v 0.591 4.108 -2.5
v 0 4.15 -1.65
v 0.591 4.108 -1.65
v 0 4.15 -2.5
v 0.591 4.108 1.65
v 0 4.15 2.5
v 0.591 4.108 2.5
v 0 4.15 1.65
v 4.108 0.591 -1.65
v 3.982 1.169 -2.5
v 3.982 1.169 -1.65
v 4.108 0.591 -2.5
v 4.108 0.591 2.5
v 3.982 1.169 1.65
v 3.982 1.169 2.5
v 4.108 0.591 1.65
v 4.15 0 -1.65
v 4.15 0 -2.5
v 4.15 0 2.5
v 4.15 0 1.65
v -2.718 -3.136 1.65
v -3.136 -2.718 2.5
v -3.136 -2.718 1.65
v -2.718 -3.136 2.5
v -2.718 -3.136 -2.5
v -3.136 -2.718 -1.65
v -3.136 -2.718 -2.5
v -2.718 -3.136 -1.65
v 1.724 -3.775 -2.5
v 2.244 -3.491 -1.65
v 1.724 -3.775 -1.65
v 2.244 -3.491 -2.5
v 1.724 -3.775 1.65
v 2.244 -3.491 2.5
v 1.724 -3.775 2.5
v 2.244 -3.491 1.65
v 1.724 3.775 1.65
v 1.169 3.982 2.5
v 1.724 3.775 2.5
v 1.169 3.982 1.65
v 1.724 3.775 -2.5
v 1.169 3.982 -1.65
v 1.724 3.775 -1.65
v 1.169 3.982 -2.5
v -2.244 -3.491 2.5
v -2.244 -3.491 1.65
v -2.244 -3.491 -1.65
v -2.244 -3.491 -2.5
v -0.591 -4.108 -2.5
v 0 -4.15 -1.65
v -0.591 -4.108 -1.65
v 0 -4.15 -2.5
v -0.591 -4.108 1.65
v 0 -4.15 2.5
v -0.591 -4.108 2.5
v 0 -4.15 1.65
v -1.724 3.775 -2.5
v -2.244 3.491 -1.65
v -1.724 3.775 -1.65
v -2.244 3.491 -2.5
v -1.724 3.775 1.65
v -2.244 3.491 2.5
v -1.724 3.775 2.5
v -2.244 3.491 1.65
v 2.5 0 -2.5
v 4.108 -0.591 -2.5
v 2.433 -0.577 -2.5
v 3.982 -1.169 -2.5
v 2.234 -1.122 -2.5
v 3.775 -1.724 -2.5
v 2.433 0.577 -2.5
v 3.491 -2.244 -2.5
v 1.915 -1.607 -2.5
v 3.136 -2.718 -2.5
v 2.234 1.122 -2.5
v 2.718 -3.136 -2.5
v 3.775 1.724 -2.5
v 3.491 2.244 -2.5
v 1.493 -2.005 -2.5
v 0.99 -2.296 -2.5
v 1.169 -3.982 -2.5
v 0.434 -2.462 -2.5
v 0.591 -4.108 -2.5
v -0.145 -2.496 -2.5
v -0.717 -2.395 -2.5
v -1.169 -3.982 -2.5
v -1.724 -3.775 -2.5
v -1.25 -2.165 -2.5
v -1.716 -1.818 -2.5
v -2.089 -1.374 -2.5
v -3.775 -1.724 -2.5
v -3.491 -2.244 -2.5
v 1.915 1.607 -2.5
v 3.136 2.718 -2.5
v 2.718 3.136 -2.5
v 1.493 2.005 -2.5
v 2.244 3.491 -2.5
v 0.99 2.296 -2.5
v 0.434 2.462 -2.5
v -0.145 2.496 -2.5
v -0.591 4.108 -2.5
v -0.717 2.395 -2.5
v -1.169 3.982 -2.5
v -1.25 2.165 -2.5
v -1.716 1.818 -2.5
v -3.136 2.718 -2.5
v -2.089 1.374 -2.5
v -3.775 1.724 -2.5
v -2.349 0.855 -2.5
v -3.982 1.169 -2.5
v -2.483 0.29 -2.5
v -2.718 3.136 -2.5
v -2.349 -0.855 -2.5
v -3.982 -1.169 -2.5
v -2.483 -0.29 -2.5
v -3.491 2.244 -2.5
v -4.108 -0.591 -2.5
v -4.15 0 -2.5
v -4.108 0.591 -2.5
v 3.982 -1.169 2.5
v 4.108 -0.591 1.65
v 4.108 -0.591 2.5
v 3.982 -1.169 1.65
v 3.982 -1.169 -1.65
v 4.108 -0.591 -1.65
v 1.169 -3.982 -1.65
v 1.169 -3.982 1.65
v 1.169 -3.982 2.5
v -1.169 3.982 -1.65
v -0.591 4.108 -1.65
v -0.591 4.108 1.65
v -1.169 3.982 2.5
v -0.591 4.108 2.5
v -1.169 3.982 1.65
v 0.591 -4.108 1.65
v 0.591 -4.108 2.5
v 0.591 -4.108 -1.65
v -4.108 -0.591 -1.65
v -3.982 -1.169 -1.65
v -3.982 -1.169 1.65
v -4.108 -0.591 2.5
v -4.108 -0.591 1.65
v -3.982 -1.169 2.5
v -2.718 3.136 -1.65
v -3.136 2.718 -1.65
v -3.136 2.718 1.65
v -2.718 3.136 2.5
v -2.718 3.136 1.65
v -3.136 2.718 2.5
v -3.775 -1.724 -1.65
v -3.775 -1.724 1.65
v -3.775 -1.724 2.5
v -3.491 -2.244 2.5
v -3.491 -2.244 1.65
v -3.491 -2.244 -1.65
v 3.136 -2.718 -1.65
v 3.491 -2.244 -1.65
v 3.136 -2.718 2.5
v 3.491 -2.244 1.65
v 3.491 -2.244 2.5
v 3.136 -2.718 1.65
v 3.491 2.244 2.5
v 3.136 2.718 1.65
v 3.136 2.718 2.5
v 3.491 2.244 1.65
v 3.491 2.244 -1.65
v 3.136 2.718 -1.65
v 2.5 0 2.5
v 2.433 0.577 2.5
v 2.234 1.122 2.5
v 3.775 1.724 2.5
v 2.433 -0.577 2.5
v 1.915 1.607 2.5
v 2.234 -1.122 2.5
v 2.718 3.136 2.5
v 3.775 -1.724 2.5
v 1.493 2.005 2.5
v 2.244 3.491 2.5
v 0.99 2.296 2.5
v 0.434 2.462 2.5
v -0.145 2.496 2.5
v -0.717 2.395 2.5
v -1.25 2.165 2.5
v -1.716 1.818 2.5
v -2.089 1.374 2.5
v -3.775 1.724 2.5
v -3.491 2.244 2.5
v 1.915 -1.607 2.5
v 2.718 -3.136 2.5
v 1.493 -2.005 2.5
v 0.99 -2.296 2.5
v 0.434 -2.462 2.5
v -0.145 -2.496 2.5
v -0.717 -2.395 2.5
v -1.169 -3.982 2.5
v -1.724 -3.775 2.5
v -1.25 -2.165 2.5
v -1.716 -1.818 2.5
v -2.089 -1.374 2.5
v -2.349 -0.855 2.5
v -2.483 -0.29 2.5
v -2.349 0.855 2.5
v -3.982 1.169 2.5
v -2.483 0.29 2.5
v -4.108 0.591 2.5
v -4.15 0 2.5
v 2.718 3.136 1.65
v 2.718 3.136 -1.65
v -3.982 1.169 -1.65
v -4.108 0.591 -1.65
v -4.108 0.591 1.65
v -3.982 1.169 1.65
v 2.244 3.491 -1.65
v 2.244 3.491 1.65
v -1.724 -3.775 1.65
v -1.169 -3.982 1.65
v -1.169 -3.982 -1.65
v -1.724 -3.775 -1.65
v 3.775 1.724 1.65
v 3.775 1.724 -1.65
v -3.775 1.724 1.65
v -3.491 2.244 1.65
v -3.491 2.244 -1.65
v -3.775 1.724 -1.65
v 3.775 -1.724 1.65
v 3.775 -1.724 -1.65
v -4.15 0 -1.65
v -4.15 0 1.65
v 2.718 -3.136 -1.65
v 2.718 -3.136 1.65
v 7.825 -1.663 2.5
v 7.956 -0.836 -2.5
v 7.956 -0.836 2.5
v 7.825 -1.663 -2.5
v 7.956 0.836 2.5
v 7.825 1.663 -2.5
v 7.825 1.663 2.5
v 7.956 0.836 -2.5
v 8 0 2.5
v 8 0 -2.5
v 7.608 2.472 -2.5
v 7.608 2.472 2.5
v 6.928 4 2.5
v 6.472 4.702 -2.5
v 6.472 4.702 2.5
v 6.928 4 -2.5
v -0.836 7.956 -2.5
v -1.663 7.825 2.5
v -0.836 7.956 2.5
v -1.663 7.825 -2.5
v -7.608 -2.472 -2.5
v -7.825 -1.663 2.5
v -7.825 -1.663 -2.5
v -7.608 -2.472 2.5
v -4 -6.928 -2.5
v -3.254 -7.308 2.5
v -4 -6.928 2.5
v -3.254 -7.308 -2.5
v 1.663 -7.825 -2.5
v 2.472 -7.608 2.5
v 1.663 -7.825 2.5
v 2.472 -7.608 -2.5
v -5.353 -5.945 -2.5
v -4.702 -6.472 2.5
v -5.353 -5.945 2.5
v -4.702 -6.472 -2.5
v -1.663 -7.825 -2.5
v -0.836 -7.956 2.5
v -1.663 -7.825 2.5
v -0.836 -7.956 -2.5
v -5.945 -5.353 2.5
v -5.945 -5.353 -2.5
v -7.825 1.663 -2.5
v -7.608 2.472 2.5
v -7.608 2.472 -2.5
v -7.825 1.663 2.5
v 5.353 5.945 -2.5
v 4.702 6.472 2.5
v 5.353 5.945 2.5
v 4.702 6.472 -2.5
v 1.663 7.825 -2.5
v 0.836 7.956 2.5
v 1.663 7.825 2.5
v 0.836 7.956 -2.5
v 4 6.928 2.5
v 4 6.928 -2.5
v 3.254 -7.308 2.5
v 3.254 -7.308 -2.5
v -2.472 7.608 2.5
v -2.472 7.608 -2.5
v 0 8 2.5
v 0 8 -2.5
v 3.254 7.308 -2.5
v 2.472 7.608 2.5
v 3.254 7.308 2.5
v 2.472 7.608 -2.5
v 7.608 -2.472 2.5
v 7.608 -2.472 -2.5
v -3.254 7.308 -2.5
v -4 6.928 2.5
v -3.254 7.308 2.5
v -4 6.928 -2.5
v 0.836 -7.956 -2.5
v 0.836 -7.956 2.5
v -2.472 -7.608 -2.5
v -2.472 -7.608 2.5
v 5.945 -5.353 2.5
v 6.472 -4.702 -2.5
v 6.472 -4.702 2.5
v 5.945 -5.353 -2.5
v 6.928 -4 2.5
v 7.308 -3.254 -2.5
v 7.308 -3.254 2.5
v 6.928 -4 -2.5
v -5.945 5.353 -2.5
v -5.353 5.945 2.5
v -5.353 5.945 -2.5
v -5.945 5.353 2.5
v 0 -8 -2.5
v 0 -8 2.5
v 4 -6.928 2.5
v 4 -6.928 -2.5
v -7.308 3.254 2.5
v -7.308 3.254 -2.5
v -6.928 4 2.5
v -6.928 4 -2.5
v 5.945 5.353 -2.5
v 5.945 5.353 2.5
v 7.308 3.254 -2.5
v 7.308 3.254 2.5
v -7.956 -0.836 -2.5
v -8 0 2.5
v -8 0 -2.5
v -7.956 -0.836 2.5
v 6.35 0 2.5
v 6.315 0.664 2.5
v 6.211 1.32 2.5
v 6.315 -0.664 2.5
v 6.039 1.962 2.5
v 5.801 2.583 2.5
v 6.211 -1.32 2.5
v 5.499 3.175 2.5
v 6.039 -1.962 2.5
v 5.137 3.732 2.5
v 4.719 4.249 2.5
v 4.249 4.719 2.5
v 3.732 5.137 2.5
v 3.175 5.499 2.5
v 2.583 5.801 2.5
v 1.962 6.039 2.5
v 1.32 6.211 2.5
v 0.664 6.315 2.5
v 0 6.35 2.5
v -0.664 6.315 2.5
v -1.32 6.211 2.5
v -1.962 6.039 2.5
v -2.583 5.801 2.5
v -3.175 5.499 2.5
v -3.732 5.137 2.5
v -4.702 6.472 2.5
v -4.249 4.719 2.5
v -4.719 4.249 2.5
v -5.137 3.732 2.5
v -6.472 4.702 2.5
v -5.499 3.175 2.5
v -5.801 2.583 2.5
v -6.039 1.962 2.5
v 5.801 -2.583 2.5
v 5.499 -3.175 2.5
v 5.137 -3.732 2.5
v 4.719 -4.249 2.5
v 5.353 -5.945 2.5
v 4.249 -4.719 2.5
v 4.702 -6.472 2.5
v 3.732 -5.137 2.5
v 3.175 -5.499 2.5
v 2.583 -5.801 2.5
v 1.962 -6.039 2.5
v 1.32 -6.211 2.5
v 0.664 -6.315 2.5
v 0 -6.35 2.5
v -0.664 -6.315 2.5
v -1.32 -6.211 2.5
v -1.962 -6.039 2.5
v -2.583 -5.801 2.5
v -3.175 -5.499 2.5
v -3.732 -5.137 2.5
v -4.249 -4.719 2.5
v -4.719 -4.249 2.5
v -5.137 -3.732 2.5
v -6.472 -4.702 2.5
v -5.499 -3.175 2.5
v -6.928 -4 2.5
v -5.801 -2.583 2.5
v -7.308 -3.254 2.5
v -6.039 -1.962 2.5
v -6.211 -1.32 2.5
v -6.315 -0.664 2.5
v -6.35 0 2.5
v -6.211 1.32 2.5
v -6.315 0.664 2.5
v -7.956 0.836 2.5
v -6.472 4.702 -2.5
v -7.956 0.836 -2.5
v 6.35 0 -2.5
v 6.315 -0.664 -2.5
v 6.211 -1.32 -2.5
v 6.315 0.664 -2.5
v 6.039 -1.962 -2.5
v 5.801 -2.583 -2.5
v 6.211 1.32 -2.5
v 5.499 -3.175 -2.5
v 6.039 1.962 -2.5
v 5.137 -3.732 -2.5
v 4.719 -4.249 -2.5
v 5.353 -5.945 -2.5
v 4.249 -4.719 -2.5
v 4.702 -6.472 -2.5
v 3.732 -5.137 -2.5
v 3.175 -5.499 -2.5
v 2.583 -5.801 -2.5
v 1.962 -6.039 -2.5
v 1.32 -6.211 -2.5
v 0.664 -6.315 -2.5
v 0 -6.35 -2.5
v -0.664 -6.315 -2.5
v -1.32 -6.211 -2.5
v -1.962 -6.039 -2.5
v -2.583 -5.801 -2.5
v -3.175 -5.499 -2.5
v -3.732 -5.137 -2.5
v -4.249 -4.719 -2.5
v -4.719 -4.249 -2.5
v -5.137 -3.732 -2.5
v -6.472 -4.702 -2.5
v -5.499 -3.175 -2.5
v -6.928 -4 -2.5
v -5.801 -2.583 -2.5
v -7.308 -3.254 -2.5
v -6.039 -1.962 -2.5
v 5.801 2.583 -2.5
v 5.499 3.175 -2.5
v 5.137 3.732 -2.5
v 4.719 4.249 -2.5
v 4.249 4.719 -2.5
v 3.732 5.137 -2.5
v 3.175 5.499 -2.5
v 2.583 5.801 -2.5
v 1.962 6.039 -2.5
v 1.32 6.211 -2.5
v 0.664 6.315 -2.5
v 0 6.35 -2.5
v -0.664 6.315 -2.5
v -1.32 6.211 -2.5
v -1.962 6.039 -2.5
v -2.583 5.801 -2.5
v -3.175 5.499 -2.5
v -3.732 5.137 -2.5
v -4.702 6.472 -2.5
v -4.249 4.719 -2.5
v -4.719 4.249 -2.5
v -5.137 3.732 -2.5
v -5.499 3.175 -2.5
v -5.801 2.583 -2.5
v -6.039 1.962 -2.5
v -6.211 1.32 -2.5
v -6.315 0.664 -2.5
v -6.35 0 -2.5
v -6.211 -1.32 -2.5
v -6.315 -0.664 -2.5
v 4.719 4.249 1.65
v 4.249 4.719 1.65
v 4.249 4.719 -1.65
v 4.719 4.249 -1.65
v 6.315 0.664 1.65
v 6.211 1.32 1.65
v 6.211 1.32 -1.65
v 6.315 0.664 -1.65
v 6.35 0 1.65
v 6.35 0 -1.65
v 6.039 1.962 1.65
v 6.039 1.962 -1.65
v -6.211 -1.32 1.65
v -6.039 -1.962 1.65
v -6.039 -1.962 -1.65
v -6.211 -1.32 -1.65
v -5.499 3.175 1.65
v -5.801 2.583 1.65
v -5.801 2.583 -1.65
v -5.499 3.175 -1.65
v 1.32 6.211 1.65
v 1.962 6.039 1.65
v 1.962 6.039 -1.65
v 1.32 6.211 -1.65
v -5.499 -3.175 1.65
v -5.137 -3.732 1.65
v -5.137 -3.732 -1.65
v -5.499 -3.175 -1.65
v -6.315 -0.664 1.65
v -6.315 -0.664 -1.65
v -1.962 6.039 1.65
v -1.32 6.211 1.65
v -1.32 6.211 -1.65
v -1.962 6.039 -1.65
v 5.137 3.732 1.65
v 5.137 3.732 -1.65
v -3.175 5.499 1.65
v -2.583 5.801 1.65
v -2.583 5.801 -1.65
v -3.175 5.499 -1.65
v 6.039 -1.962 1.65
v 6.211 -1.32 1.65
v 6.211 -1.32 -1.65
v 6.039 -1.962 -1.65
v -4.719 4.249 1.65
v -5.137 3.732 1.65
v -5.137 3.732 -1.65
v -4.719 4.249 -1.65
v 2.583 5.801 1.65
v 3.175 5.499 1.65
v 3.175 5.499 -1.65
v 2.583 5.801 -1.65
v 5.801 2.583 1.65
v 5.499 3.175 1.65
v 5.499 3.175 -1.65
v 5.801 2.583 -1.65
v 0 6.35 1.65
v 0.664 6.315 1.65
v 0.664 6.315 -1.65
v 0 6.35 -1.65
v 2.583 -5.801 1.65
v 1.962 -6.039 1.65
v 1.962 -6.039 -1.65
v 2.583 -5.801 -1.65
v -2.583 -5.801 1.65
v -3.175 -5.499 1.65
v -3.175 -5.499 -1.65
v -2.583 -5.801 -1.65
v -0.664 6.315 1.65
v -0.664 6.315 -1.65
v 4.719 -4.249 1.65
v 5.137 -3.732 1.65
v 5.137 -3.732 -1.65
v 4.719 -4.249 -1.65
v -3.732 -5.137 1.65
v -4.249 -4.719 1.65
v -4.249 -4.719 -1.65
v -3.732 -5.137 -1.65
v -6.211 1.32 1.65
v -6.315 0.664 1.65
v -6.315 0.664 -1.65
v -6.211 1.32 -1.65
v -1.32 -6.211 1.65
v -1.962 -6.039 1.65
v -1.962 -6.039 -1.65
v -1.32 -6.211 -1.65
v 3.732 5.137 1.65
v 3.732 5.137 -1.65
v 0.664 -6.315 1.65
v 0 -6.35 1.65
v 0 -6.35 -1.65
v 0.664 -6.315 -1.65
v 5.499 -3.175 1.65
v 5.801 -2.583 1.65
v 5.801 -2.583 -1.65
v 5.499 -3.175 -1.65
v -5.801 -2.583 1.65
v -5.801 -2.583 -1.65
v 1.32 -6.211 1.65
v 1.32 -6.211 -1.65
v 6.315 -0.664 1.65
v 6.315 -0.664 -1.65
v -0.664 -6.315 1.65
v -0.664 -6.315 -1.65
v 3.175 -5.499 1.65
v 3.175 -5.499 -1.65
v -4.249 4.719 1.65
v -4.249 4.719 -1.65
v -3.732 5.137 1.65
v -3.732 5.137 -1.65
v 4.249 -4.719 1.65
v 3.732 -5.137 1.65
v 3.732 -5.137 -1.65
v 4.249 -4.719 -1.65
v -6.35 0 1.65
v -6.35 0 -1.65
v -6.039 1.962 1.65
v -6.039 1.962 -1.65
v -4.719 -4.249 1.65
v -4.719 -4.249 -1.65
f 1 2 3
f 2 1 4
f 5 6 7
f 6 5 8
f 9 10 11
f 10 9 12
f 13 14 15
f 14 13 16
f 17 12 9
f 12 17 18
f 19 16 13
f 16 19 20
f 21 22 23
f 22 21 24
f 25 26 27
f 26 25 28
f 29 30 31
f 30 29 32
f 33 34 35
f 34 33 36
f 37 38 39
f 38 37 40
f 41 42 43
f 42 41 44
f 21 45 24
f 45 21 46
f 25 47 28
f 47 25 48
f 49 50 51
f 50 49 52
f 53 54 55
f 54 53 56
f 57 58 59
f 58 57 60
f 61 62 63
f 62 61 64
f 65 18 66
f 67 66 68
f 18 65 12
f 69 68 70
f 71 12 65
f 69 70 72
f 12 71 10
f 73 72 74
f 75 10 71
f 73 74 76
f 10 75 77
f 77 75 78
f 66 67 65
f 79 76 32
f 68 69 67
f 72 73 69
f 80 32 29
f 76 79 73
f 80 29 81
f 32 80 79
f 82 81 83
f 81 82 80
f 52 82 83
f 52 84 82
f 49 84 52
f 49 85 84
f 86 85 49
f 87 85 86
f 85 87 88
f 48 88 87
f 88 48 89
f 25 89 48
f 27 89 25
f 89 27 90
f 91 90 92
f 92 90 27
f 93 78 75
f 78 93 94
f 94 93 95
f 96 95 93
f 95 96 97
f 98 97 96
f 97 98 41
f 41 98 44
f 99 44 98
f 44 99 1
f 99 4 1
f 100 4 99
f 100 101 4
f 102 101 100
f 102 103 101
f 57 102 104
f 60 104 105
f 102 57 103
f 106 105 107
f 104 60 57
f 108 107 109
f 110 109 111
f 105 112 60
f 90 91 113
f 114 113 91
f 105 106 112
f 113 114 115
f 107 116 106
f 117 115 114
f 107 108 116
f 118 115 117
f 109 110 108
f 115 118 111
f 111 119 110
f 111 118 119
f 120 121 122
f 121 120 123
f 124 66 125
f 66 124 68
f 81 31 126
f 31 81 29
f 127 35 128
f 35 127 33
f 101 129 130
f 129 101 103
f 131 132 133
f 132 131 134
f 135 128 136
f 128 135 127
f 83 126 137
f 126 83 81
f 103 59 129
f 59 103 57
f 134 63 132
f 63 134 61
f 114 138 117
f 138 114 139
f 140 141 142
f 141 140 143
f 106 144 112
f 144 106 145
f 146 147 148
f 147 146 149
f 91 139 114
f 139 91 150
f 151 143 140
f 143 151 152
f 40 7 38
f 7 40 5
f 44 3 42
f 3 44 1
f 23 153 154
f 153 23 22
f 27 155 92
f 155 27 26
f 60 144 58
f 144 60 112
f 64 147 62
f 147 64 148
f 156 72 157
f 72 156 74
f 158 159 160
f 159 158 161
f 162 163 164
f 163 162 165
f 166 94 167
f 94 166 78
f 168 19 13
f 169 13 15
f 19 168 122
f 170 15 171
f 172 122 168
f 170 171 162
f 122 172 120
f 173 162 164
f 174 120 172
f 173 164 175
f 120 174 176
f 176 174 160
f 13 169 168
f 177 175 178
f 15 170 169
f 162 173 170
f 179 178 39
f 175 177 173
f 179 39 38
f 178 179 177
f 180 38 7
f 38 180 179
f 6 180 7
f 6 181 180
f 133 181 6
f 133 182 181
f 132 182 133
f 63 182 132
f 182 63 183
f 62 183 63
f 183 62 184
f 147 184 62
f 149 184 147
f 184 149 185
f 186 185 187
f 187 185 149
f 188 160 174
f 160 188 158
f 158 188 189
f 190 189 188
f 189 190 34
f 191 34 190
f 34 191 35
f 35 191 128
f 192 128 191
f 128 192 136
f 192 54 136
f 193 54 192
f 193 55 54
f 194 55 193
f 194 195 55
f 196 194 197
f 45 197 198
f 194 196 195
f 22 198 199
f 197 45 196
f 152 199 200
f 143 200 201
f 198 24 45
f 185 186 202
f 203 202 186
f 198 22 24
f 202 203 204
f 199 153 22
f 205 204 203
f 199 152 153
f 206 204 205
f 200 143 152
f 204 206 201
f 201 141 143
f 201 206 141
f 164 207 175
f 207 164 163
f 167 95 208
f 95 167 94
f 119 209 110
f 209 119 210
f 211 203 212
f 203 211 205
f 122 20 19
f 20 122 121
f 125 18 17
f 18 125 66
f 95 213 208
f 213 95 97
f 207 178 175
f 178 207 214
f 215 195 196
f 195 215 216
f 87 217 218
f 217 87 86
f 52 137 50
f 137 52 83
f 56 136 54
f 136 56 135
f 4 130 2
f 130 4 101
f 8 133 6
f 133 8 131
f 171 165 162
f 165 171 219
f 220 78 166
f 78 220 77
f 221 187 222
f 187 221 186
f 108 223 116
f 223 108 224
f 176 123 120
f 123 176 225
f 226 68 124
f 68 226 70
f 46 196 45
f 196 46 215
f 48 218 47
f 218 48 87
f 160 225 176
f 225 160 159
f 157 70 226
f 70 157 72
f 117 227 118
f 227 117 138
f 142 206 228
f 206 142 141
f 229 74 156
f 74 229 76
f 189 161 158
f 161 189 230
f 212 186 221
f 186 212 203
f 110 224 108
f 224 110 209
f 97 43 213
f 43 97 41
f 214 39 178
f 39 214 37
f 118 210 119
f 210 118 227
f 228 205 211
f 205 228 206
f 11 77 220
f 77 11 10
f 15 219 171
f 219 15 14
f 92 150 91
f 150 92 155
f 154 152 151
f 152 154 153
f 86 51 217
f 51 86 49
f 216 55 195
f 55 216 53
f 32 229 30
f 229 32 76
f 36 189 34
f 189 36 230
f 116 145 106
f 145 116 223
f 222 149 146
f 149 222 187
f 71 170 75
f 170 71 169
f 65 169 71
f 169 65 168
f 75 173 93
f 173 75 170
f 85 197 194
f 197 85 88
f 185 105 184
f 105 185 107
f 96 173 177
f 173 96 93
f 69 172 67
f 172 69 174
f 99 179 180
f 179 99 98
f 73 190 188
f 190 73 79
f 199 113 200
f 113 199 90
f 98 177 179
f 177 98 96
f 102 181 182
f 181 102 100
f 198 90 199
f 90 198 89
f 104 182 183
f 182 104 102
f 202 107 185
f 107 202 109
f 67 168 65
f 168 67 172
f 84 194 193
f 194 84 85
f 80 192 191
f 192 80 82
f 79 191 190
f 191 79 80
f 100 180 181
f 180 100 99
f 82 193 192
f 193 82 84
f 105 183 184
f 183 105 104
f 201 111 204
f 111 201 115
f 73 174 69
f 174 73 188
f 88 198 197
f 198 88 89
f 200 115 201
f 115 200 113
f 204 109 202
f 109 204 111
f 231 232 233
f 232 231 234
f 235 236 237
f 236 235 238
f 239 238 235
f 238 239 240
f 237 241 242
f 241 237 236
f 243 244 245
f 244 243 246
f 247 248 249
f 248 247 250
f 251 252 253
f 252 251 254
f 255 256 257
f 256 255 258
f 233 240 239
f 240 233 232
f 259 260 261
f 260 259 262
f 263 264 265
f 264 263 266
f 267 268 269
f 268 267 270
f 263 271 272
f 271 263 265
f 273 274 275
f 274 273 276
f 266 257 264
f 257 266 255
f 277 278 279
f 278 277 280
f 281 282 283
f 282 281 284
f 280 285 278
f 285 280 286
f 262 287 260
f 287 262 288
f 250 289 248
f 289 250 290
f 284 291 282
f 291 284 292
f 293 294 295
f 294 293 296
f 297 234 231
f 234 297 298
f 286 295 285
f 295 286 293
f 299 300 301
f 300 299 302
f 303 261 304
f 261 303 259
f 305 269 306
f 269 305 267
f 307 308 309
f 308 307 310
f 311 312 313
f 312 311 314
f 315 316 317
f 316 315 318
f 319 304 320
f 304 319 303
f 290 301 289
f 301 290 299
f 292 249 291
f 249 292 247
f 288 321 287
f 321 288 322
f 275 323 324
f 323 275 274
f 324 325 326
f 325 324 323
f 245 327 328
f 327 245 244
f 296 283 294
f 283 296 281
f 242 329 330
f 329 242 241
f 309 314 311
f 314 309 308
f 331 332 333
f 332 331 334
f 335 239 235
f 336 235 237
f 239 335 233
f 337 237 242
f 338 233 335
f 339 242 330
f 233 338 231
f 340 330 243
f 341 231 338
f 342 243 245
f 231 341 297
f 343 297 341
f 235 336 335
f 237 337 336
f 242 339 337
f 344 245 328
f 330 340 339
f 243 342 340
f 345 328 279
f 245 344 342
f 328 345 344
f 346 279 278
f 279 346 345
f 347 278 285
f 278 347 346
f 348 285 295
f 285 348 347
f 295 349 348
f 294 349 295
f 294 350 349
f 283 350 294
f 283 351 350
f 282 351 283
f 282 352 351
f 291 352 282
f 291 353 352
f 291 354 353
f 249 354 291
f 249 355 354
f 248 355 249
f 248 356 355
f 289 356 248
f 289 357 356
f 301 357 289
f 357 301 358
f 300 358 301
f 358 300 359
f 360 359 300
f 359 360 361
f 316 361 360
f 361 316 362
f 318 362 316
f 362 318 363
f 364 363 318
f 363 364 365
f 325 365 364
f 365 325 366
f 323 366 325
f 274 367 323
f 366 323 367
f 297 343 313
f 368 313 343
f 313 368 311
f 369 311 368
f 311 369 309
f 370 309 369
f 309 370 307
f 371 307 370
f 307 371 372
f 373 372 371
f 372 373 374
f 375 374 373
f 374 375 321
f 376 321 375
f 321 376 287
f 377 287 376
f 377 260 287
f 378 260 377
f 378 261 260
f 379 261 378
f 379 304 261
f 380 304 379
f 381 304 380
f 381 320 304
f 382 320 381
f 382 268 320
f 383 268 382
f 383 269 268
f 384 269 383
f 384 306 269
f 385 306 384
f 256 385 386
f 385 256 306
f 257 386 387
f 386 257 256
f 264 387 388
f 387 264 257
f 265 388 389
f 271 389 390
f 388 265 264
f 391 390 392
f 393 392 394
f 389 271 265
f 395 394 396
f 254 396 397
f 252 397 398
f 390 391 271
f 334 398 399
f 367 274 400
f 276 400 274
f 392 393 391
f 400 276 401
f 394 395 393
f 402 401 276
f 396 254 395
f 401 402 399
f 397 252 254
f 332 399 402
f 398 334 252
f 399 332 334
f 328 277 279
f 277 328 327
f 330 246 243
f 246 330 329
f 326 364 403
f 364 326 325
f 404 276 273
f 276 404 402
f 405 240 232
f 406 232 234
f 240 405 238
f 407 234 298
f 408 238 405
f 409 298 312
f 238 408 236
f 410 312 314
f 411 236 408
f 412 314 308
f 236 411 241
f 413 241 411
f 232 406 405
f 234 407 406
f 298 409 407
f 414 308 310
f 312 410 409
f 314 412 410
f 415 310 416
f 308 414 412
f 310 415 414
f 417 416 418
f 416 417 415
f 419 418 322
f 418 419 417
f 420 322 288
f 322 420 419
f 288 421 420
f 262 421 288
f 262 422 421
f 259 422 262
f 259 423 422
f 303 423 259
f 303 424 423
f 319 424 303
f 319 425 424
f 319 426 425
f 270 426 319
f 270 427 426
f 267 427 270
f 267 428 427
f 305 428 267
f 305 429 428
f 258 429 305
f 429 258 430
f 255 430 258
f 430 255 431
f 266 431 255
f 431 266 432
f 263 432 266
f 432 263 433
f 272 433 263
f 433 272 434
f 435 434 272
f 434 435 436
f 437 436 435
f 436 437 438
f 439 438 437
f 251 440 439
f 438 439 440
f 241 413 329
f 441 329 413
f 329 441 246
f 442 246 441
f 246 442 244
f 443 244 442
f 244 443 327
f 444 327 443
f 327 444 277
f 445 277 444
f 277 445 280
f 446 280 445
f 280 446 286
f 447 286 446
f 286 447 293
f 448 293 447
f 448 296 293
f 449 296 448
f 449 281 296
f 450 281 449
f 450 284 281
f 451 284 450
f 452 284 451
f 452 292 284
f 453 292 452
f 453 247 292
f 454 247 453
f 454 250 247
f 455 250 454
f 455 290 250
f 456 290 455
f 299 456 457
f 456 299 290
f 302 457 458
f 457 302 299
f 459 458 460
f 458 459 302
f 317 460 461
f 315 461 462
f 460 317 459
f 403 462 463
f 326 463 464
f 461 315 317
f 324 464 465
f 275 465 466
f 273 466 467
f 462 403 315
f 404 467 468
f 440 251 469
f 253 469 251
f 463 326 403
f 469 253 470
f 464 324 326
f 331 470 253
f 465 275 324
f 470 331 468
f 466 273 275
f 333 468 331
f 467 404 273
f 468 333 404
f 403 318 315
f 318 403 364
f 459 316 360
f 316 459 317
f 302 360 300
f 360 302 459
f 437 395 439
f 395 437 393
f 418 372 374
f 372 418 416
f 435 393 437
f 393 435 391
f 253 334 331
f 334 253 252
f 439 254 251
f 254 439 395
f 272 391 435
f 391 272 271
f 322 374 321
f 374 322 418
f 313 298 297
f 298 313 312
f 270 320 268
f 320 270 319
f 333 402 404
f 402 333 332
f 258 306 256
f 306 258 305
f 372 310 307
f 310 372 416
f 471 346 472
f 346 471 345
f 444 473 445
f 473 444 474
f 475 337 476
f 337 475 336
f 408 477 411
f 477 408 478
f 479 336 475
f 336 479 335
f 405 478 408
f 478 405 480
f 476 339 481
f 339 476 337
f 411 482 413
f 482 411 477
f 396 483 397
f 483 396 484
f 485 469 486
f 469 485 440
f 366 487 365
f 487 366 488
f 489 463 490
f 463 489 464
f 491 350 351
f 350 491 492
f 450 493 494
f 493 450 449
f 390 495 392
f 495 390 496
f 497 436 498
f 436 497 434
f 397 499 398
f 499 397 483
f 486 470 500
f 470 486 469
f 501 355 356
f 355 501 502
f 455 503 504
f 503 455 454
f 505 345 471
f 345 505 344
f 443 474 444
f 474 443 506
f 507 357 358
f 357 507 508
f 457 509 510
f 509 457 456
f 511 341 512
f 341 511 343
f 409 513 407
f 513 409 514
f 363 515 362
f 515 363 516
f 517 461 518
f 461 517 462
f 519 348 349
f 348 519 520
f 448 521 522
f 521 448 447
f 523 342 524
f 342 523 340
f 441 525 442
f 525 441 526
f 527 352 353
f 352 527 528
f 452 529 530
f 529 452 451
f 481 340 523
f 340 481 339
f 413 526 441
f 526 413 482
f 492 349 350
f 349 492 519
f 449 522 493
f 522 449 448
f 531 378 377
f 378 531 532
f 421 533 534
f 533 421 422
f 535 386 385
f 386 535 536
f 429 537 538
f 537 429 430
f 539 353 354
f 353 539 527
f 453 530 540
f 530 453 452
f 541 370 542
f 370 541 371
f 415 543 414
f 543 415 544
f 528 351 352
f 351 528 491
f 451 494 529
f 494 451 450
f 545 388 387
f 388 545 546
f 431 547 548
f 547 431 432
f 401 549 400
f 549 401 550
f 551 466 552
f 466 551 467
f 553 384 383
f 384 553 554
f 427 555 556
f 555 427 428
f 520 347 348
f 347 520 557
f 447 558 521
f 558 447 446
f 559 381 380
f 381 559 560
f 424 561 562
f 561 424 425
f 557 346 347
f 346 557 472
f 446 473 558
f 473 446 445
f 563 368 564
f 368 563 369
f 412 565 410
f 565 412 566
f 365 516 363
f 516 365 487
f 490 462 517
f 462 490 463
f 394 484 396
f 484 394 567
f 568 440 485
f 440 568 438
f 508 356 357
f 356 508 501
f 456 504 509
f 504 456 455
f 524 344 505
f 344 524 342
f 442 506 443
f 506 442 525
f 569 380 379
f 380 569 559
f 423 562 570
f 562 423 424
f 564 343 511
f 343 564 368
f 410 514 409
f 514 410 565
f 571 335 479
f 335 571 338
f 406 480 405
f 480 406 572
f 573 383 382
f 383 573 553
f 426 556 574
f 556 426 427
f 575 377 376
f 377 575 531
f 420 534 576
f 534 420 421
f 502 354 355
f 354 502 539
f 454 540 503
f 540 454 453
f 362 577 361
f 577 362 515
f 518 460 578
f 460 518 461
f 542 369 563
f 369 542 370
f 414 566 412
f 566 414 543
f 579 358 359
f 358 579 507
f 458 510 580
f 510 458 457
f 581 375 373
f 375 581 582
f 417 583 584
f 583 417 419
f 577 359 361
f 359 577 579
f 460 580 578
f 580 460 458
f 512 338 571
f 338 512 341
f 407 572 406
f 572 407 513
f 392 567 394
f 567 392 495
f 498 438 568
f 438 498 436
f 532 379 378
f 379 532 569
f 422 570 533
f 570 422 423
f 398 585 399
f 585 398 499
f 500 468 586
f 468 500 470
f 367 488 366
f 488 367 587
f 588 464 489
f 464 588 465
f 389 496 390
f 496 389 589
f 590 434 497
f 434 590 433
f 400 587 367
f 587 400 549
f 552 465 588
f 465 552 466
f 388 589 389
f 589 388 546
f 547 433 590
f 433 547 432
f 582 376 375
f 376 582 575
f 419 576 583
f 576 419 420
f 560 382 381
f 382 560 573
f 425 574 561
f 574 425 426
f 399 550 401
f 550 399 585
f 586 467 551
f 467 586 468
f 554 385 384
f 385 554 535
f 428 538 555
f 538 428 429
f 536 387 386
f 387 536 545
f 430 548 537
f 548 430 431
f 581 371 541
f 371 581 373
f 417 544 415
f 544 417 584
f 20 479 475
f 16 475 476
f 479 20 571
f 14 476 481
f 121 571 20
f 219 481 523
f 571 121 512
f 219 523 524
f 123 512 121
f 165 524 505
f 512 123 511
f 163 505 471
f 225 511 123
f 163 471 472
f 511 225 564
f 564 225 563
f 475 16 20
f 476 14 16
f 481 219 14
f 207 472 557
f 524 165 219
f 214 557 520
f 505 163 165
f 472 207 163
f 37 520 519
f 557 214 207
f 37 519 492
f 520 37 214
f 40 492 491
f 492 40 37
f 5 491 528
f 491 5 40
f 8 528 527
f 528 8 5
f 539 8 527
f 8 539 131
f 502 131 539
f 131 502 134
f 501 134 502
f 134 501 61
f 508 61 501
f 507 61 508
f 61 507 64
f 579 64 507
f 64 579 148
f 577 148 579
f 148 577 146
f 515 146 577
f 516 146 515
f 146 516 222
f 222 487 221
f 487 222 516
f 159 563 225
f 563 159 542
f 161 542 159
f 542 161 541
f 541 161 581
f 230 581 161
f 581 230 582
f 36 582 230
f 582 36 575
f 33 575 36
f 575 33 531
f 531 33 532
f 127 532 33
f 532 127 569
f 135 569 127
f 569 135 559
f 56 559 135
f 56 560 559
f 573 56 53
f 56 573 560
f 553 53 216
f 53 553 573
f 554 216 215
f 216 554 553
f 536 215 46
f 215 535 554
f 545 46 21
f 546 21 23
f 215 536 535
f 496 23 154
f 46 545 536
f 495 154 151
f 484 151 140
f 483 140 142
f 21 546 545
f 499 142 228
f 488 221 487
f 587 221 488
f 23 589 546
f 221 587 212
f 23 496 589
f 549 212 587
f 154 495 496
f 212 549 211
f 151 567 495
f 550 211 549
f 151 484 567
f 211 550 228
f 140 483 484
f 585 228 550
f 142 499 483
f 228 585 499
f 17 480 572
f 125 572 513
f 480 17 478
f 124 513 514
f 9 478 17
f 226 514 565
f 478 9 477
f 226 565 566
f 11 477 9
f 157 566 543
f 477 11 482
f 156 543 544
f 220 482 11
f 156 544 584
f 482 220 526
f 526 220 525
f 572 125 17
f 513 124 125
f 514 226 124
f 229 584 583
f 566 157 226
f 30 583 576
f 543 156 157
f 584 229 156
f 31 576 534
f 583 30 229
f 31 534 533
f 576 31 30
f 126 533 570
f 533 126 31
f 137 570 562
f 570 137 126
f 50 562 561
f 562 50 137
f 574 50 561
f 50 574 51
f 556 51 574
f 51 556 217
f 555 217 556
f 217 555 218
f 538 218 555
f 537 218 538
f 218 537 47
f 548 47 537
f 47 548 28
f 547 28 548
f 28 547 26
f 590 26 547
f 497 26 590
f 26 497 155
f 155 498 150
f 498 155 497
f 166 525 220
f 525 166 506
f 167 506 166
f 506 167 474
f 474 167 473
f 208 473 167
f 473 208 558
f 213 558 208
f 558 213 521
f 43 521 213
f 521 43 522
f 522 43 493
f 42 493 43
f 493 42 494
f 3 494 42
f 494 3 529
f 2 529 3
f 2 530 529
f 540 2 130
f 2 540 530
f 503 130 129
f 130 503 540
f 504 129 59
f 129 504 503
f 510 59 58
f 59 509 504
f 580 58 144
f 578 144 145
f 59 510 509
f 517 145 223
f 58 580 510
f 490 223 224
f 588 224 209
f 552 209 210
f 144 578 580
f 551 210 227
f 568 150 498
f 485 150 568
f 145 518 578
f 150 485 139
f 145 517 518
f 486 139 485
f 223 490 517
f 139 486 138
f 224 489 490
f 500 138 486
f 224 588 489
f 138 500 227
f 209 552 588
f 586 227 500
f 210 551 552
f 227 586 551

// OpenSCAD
use <common.scad>

// 용어:
// 1. 내경(bore)
// 2. 외경(outer diameter)
// 3. 폭(width)
// 4. 베어링(bearing)
//
// [내경(bore), 외경(outer diameter), 폭(width)] mm — 부품이 베어링(bearing) 치수를 참조할 때 쓰는 공개 값이다.
function bearing_625zz_spec() = [5, 16, 5];

module bearing_625zz(part_color = [0, 0.6, 1]) {
    bearing(bearing_spec = bearing_625zz_spec(), part_color = part_color);
}

bearing_625zz();
